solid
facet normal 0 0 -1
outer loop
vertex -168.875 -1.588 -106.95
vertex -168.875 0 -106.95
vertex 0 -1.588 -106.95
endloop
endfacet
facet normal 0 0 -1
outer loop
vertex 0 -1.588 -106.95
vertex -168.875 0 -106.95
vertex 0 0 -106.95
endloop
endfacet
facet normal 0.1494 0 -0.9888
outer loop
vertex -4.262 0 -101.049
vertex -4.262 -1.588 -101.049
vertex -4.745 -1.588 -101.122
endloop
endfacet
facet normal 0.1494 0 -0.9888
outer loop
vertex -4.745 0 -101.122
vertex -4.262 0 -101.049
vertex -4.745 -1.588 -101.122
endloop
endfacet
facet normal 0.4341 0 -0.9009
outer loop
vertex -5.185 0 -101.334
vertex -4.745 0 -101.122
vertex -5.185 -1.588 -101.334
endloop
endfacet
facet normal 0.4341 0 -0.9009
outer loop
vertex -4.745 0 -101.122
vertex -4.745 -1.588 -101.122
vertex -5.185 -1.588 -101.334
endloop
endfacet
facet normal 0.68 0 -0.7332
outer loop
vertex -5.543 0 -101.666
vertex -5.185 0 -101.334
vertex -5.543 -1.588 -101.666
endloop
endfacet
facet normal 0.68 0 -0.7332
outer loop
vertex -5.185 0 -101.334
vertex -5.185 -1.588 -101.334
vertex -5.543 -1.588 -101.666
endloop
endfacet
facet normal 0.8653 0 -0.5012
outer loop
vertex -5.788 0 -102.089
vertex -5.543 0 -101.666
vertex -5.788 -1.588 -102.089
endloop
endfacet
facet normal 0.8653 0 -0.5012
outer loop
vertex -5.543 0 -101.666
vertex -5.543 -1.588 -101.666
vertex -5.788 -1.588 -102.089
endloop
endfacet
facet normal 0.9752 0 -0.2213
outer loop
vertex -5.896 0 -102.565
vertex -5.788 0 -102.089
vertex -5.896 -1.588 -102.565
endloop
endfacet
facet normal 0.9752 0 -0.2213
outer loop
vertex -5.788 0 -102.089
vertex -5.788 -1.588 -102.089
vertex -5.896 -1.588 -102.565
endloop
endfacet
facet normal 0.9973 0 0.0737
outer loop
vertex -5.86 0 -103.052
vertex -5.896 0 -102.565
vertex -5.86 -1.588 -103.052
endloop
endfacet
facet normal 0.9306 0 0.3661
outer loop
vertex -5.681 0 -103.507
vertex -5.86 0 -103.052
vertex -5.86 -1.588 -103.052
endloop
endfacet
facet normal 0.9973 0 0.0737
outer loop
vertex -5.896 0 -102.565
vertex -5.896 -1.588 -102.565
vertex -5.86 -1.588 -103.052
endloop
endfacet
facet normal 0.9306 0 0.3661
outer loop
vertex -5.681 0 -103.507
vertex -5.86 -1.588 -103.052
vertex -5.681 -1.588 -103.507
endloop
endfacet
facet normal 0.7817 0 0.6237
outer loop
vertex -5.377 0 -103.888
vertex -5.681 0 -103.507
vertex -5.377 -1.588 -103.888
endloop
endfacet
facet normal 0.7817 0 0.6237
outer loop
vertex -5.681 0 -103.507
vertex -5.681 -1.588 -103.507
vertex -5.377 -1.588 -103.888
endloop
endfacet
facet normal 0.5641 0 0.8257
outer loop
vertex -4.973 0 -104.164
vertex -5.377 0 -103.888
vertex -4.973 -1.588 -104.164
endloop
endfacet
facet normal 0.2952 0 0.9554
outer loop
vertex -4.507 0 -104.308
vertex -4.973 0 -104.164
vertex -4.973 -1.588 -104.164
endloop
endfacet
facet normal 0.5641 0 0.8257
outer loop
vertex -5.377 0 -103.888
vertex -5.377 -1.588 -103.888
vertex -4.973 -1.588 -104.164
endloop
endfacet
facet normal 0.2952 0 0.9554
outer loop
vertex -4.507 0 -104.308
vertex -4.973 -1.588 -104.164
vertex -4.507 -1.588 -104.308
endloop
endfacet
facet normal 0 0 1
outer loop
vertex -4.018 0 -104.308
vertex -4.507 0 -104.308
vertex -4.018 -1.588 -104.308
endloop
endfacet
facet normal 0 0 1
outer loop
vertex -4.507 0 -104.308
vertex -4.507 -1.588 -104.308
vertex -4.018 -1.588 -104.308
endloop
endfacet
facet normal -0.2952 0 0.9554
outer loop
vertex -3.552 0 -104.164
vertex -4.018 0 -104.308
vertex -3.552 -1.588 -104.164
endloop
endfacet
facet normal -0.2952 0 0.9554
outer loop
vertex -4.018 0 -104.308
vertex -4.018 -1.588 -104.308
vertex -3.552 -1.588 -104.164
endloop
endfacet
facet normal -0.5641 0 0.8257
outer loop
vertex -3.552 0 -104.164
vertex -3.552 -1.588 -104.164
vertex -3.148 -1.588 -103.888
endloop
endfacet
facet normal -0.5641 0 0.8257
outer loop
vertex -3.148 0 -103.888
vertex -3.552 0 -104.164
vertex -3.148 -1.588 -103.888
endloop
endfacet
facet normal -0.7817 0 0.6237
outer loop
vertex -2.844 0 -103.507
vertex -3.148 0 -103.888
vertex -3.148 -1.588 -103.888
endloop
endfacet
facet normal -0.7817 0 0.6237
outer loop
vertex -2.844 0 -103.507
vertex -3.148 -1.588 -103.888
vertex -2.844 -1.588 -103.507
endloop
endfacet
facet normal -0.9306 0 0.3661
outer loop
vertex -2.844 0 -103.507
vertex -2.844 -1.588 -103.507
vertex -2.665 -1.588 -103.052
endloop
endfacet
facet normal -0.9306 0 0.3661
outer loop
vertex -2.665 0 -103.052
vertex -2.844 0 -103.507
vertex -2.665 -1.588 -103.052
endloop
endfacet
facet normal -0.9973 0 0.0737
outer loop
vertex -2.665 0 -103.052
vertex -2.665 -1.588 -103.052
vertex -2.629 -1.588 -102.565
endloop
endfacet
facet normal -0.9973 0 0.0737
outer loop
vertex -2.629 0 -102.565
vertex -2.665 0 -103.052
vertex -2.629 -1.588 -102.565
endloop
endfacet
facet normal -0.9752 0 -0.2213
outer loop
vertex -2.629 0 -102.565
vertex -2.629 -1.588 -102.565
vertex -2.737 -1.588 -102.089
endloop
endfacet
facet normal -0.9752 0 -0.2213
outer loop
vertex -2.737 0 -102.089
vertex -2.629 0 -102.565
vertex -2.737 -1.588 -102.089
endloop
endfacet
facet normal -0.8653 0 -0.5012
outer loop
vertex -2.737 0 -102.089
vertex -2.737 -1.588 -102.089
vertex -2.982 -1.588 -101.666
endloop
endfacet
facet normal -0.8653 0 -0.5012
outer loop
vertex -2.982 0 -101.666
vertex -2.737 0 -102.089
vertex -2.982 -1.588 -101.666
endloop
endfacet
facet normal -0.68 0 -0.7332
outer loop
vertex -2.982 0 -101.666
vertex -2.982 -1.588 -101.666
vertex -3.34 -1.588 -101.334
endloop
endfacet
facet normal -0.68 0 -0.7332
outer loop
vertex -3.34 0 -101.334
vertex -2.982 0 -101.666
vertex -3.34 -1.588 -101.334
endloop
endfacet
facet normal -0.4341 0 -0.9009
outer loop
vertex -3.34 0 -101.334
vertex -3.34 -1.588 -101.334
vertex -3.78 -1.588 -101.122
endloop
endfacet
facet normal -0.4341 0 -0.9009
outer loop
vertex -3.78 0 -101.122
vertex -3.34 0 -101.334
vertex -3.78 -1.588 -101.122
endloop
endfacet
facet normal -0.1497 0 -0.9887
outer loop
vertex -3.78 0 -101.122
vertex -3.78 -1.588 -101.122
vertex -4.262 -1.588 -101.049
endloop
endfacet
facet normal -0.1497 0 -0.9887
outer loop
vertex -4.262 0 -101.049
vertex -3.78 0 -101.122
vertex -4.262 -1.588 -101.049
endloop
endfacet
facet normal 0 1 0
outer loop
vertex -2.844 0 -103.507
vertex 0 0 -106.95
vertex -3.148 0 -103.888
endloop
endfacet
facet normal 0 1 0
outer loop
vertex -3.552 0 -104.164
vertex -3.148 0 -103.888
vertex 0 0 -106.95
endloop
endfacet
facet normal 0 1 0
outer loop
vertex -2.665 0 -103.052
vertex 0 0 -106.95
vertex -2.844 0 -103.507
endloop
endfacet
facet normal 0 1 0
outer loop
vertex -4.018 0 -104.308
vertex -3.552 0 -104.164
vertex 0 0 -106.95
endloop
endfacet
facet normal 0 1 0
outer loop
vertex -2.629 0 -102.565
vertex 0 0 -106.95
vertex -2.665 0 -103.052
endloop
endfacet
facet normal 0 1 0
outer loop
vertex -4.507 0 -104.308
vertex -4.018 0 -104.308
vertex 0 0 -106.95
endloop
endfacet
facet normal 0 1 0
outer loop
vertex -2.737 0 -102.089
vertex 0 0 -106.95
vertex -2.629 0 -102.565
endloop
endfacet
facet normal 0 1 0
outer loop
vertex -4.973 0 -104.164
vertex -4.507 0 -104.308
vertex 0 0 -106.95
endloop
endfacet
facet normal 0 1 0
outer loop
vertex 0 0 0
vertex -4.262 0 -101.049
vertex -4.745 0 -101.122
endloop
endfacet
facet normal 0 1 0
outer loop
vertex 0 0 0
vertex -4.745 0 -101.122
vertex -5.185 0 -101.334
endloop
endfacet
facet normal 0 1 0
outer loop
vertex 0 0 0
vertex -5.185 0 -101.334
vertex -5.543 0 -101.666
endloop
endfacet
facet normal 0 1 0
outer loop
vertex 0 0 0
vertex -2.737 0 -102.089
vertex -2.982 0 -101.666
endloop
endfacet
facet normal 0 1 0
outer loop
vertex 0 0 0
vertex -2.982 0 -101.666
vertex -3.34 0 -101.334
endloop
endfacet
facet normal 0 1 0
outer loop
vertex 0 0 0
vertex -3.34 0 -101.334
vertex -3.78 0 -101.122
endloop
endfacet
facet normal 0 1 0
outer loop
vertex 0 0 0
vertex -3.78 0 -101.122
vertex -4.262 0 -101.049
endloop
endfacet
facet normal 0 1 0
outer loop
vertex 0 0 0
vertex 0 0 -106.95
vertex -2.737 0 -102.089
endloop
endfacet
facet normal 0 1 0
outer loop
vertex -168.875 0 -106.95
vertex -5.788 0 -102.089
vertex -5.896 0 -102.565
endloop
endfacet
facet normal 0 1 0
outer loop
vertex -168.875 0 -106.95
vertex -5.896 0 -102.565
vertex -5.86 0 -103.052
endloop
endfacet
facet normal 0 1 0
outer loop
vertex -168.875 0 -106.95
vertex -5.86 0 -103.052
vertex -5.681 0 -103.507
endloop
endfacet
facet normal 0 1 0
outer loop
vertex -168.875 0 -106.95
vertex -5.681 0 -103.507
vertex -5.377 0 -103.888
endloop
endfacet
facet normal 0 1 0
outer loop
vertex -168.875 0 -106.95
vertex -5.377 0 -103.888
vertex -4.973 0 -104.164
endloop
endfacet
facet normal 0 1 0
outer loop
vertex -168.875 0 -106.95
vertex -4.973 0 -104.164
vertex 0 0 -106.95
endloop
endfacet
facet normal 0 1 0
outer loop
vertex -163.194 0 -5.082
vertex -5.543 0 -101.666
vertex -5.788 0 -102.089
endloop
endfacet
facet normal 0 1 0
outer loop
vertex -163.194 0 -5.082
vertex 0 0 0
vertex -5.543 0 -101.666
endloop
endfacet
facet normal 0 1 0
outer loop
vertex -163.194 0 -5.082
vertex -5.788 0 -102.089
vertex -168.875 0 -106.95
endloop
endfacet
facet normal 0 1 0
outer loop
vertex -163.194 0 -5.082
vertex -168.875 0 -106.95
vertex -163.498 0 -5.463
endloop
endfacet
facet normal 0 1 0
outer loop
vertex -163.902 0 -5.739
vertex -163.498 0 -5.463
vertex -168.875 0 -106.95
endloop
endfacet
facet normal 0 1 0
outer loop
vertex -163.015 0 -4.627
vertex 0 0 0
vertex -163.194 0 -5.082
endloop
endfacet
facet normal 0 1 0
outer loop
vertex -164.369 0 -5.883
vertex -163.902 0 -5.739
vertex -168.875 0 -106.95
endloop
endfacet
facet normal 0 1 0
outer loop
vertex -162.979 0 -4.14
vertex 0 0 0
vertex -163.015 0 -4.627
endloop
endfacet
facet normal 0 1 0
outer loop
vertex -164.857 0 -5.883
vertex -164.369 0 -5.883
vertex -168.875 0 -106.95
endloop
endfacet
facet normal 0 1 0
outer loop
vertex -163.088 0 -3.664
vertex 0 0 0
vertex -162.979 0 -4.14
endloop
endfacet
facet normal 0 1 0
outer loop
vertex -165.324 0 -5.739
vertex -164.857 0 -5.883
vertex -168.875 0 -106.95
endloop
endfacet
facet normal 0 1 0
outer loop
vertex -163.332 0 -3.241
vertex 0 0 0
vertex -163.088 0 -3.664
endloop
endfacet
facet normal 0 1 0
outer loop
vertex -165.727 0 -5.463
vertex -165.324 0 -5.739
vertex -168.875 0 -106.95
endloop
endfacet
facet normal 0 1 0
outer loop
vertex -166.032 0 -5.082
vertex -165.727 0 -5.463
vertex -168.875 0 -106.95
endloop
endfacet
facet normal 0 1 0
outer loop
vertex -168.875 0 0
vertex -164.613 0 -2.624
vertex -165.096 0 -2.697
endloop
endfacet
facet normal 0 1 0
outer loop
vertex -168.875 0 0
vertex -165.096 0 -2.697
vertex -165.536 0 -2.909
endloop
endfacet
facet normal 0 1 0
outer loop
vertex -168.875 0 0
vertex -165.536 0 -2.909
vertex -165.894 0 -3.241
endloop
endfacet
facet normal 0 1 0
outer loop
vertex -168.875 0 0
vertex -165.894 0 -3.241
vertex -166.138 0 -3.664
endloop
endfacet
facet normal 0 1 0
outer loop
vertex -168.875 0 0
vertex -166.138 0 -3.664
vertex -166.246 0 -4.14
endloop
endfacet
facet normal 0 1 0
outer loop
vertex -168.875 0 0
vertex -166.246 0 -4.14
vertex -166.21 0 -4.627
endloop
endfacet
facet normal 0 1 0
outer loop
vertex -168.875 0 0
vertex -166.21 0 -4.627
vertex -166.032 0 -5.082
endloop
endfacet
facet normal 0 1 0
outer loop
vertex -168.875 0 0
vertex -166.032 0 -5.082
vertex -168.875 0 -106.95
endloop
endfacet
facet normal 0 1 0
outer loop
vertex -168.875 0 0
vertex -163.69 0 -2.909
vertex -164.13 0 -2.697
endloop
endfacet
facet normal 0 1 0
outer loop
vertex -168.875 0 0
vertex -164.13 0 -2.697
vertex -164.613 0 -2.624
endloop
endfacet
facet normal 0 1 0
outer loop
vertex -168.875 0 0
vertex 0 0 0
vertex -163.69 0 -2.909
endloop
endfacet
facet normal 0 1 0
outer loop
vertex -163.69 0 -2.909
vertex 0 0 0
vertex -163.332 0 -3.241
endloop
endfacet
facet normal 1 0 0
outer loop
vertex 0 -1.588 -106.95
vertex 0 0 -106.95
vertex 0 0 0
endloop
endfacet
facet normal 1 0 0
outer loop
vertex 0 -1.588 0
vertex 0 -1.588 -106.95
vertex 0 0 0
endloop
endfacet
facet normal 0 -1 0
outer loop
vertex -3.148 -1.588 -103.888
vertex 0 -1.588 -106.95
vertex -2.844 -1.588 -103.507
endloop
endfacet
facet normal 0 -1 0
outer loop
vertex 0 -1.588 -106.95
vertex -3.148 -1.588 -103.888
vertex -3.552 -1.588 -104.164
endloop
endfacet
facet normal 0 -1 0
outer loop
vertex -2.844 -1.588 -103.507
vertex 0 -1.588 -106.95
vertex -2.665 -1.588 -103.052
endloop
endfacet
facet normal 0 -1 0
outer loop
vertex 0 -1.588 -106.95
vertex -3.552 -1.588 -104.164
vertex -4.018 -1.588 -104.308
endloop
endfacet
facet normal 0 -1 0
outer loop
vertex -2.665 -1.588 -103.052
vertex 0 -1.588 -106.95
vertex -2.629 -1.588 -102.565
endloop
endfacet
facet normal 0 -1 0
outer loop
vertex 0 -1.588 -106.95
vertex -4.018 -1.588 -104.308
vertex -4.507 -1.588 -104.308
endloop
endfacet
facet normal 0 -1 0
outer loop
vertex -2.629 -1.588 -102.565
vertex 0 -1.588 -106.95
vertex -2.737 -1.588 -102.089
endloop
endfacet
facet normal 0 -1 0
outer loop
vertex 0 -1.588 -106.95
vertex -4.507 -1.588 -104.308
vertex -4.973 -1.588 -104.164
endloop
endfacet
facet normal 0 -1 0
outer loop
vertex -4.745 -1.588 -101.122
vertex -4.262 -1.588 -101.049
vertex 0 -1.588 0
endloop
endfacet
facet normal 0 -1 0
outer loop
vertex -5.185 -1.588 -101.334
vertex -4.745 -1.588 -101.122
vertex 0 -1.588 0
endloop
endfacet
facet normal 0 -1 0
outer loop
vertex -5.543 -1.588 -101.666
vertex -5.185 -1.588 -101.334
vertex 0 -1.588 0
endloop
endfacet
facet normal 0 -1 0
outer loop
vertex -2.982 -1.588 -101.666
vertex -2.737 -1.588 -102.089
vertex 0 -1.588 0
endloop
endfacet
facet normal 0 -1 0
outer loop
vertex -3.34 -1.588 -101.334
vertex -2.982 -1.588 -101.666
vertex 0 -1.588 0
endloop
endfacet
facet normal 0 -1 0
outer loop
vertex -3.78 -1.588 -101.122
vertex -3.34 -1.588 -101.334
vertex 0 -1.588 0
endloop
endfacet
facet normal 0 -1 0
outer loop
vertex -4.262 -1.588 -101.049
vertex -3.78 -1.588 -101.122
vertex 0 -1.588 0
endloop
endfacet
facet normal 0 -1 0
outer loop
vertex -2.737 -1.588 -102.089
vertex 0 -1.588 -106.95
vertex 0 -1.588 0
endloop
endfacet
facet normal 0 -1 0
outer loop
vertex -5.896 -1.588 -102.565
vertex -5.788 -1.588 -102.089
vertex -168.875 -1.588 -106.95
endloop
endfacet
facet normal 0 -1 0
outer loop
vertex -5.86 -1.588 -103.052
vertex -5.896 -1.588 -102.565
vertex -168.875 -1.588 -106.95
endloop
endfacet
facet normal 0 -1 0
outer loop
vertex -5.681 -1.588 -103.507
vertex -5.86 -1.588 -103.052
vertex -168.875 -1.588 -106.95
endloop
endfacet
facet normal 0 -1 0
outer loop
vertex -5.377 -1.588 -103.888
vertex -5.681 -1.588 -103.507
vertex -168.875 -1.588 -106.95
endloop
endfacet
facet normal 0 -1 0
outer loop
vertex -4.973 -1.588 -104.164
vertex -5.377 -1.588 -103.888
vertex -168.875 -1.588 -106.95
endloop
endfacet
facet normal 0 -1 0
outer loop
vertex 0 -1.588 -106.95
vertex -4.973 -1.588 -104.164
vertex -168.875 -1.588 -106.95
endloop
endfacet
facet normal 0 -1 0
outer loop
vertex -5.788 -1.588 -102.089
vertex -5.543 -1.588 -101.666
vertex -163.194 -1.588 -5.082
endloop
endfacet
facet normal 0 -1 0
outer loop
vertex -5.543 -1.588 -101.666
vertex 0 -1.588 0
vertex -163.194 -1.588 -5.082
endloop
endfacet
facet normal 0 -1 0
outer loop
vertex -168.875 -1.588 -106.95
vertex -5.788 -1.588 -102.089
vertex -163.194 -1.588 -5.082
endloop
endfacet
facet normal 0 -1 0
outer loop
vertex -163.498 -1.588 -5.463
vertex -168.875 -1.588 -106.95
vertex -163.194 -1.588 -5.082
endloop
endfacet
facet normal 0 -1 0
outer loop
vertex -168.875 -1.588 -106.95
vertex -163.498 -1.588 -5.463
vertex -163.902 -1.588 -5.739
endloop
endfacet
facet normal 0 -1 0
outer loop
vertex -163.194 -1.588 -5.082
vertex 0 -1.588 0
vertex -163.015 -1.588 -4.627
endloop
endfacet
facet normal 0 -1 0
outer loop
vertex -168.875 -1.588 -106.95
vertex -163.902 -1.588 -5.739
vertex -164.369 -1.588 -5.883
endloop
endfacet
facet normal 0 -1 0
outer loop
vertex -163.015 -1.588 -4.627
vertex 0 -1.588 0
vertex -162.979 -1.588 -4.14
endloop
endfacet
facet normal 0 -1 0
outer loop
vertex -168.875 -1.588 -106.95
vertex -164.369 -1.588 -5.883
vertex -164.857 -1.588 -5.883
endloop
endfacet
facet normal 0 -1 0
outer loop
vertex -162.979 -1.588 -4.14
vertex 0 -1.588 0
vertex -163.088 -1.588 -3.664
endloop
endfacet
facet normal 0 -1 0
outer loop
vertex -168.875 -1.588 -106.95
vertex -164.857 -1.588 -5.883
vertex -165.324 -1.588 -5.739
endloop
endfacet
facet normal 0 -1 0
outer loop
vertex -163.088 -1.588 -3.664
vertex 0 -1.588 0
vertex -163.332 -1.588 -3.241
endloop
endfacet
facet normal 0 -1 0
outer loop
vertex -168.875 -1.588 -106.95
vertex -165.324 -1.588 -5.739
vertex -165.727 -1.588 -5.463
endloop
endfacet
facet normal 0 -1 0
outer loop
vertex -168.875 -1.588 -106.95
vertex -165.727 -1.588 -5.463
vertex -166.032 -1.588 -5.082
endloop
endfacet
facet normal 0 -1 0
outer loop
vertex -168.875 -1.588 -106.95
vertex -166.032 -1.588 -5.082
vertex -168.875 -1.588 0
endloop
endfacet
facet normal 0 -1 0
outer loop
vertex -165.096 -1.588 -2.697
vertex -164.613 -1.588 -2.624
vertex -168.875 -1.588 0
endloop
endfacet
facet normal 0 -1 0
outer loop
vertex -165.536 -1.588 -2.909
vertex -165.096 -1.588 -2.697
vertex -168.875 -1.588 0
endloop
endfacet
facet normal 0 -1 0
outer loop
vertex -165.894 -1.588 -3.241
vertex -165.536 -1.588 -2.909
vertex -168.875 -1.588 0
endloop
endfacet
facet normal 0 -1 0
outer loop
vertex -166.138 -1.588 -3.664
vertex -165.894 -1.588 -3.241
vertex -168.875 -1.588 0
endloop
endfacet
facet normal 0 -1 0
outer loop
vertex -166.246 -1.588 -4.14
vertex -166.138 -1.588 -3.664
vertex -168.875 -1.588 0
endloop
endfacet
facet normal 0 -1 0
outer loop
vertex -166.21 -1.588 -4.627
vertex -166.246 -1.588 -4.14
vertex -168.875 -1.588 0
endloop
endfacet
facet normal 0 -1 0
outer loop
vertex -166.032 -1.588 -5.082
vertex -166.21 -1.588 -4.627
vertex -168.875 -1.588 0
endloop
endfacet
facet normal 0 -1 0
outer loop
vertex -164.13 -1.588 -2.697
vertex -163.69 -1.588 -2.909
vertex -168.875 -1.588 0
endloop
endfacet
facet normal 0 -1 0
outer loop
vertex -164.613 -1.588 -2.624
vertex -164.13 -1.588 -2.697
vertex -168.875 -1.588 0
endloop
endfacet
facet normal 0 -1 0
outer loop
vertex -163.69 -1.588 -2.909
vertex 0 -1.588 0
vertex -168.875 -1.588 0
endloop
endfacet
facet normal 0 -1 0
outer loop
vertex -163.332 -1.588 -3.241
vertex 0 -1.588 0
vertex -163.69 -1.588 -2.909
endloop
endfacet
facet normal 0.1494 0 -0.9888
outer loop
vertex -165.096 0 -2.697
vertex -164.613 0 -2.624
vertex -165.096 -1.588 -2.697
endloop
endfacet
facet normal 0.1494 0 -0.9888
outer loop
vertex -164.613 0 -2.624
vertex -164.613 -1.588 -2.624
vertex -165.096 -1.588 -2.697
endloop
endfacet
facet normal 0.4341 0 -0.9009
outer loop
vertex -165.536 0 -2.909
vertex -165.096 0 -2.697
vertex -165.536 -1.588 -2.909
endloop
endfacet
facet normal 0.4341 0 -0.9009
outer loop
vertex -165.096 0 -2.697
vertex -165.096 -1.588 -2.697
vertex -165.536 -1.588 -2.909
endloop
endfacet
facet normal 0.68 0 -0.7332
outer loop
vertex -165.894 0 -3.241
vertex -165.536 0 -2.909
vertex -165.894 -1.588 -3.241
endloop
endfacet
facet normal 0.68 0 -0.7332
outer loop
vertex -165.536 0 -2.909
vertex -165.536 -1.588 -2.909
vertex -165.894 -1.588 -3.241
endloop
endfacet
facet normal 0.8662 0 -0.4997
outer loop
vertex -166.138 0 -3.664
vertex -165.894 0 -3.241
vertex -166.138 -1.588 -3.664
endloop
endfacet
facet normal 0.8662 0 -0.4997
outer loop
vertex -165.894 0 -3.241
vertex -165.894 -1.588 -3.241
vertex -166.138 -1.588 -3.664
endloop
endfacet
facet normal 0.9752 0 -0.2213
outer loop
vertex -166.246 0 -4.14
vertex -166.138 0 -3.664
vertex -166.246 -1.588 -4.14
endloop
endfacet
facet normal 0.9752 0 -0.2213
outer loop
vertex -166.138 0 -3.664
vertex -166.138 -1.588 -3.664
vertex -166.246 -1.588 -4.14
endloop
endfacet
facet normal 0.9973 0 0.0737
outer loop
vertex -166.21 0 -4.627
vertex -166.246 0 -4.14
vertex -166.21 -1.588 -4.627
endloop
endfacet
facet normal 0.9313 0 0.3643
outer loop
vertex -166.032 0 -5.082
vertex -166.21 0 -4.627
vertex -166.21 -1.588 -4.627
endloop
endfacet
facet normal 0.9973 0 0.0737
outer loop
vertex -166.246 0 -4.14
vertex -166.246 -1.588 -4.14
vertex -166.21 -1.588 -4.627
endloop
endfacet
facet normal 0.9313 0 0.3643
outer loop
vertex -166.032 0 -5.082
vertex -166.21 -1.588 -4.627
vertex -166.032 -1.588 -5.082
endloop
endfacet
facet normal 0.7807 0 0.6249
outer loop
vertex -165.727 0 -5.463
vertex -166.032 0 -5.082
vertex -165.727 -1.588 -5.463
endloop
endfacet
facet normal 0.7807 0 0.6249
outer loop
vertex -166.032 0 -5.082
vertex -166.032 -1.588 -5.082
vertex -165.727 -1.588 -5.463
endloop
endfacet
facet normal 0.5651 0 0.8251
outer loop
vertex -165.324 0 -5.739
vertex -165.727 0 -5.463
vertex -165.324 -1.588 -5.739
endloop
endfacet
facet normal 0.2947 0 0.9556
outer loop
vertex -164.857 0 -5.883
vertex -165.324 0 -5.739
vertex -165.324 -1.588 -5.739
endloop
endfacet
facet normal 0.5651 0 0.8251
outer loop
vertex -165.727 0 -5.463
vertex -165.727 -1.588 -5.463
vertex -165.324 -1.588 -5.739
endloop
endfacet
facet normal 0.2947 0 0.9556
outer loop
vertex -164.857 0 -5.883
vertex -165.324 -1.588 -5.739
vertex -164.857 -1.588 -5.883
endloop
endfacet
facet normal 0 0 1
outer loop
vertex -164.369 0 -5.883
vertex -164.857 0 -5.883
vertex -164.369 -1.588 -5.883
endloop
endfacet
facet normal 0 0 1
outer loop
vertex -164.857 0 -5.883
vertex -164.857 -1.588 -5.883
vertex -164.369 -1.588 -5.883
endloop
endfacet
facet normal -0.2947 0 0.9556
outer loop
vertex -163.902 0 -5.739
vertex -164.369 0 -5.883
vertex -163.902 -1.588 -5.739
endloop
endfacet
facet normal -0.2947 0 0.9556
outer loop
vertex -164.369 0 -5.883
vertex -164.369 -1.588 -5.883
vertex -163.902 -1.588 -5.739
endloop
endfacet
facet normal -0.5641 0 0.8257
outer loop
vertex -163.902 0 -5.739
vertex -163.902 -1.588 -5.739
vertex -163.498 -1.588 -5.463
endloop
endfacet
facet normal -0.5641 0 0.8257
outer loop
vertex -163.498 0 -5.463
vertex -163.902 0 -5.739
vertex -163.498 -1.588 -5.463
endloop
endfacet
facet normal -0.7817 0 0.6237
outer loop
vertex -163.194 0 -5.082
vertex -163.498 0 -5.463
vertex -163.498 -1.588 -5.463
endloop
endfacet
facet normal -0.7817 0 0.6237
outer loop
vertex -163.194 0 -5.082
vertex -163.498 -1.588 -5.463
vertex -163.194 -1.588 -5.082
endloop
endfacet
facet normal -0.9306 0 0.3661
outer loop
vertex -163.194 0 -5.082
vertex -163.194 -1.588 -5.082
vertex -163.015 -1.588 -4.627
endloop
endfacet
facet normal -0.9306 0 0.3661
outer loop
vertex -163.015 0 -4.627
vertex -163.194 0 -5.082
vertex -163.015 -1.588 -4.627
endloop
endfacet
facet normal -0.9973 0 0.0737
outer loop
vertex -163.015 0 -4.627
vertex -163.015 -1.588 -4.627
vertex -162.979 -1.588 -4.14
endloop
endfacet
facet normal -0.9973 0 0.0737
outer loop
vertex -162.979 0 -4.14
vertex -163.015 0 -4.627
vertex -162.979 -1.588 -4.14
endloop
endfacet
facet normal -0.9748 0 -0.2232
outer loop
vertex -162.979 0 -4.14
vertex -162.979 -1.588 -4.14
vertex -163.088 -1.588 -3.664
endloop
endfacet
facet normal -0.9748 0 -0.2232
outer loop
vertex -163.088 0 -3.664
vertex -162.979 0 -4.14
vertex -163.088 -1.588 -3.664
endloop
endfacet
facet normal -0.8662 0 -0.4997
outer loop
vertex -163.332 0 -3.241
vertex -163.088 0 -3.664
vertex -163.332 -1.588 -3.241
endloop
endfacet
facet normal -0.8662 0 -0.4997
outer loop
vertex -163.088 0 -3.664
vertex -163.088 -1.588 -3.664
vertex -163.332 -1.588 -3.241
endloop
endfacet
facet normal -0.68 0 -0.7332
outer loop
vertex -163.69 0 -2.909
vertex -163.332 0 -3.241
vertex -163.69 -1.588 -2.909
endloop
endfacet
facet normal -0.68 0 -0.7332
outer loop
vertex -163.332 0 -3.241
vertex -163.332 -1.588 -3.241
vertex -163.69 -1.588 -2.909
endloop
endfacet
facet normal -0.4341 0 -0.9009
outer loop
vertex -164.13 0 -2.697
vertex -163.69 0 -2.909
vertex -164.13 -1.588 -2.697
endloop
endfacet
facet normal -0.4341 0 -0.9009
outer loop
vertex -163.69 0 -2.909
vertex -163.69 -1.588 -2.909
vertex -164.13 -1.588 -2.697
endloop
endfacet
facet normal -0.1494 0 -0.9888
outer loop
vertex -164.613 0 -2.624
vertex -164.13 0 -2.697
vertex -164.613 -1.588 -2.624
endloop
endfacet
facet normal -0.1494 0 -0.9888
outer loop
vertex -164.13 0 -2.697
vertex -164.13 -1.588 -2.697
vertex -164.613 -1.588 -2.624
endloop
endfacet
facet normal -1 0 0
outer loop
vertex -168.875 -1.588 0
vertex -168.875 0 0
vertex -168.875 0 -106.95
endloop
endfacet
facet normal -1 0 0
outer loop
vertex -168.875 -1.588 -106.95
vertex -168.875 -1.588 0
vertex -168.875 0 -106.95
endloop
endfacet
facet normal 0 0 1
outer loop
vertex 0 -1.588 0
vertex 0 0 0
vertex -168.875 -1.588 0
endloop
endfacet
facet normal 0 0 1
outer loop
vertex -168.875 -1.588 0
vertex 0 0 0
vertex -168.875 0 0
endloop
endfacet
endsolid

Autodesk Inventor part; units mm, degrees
ref_plane "YZ Plane" through (0, 0, 0) normal (1, 0, 0) x (0, 1, 0)
ref_plane "XZ Plane" through (0, 0, 0) normal (0, 1, 0) x (-1, 0, 0)
ref_plane "XY Plane" through (0, 0, 0) normal (0, 0, 1) x (1, 0, 0)
sketch "Sketch1" plane through (0, 0, 0) normal (0, 1, 0) x (-1, 0, 0)
  line L0 (0, 0) -> (168.8752, 0)
  line L1 (168.8752, 0) -> (168.8752, -106.95)
  line L2 (168.8752, -106.95) -> (0, -106.95)
  line L3 (0, -106.95) -> (0, 0)
  line L4 (0, -106.95) -> (4.2625, -106.95)
  line L5 (4.2625, -106.95) -> (4.2625, -102.6875)
  line L6 (4.2625, -102.6875) -> (0, -102.6875)
  line L7 (0, -102.6875) -> (0, -106.95)
  line L8 (168.8752, 0) -> (164.6127, 0)
  line L9 (164.6127, 0) -> (164.6127, -4.2625)
  line L10 (164.6127, -4.2625) -> (168.8752, -4.2625)
  line L11 (168.8752, -4.2625) -> (168.8752, 0)
  dimension "d0" = 168.8752
  dimension "d1" = 106.95
  dimension "d2" = 4.2625
  dimension "d3" = 4.2625
  dimension "d4" = 4.2625
  dimension "d5" = 4.2625
extrude "Extrusion1" add sketch "Sketch1" against normal blind 1.5875
hole "Hole1" at (-164.6127, 0, -4.2625) at (-4.2625, 0, -102.6875) direction (0, -1, 0) diameter 3.2766 end through all clearance for "Flat Head Machine Screw (82)" size "#4" standard "Ansi Unified Screw Threads"
properties part number "Compute Module Cover for RoadBot Rail-r2"
